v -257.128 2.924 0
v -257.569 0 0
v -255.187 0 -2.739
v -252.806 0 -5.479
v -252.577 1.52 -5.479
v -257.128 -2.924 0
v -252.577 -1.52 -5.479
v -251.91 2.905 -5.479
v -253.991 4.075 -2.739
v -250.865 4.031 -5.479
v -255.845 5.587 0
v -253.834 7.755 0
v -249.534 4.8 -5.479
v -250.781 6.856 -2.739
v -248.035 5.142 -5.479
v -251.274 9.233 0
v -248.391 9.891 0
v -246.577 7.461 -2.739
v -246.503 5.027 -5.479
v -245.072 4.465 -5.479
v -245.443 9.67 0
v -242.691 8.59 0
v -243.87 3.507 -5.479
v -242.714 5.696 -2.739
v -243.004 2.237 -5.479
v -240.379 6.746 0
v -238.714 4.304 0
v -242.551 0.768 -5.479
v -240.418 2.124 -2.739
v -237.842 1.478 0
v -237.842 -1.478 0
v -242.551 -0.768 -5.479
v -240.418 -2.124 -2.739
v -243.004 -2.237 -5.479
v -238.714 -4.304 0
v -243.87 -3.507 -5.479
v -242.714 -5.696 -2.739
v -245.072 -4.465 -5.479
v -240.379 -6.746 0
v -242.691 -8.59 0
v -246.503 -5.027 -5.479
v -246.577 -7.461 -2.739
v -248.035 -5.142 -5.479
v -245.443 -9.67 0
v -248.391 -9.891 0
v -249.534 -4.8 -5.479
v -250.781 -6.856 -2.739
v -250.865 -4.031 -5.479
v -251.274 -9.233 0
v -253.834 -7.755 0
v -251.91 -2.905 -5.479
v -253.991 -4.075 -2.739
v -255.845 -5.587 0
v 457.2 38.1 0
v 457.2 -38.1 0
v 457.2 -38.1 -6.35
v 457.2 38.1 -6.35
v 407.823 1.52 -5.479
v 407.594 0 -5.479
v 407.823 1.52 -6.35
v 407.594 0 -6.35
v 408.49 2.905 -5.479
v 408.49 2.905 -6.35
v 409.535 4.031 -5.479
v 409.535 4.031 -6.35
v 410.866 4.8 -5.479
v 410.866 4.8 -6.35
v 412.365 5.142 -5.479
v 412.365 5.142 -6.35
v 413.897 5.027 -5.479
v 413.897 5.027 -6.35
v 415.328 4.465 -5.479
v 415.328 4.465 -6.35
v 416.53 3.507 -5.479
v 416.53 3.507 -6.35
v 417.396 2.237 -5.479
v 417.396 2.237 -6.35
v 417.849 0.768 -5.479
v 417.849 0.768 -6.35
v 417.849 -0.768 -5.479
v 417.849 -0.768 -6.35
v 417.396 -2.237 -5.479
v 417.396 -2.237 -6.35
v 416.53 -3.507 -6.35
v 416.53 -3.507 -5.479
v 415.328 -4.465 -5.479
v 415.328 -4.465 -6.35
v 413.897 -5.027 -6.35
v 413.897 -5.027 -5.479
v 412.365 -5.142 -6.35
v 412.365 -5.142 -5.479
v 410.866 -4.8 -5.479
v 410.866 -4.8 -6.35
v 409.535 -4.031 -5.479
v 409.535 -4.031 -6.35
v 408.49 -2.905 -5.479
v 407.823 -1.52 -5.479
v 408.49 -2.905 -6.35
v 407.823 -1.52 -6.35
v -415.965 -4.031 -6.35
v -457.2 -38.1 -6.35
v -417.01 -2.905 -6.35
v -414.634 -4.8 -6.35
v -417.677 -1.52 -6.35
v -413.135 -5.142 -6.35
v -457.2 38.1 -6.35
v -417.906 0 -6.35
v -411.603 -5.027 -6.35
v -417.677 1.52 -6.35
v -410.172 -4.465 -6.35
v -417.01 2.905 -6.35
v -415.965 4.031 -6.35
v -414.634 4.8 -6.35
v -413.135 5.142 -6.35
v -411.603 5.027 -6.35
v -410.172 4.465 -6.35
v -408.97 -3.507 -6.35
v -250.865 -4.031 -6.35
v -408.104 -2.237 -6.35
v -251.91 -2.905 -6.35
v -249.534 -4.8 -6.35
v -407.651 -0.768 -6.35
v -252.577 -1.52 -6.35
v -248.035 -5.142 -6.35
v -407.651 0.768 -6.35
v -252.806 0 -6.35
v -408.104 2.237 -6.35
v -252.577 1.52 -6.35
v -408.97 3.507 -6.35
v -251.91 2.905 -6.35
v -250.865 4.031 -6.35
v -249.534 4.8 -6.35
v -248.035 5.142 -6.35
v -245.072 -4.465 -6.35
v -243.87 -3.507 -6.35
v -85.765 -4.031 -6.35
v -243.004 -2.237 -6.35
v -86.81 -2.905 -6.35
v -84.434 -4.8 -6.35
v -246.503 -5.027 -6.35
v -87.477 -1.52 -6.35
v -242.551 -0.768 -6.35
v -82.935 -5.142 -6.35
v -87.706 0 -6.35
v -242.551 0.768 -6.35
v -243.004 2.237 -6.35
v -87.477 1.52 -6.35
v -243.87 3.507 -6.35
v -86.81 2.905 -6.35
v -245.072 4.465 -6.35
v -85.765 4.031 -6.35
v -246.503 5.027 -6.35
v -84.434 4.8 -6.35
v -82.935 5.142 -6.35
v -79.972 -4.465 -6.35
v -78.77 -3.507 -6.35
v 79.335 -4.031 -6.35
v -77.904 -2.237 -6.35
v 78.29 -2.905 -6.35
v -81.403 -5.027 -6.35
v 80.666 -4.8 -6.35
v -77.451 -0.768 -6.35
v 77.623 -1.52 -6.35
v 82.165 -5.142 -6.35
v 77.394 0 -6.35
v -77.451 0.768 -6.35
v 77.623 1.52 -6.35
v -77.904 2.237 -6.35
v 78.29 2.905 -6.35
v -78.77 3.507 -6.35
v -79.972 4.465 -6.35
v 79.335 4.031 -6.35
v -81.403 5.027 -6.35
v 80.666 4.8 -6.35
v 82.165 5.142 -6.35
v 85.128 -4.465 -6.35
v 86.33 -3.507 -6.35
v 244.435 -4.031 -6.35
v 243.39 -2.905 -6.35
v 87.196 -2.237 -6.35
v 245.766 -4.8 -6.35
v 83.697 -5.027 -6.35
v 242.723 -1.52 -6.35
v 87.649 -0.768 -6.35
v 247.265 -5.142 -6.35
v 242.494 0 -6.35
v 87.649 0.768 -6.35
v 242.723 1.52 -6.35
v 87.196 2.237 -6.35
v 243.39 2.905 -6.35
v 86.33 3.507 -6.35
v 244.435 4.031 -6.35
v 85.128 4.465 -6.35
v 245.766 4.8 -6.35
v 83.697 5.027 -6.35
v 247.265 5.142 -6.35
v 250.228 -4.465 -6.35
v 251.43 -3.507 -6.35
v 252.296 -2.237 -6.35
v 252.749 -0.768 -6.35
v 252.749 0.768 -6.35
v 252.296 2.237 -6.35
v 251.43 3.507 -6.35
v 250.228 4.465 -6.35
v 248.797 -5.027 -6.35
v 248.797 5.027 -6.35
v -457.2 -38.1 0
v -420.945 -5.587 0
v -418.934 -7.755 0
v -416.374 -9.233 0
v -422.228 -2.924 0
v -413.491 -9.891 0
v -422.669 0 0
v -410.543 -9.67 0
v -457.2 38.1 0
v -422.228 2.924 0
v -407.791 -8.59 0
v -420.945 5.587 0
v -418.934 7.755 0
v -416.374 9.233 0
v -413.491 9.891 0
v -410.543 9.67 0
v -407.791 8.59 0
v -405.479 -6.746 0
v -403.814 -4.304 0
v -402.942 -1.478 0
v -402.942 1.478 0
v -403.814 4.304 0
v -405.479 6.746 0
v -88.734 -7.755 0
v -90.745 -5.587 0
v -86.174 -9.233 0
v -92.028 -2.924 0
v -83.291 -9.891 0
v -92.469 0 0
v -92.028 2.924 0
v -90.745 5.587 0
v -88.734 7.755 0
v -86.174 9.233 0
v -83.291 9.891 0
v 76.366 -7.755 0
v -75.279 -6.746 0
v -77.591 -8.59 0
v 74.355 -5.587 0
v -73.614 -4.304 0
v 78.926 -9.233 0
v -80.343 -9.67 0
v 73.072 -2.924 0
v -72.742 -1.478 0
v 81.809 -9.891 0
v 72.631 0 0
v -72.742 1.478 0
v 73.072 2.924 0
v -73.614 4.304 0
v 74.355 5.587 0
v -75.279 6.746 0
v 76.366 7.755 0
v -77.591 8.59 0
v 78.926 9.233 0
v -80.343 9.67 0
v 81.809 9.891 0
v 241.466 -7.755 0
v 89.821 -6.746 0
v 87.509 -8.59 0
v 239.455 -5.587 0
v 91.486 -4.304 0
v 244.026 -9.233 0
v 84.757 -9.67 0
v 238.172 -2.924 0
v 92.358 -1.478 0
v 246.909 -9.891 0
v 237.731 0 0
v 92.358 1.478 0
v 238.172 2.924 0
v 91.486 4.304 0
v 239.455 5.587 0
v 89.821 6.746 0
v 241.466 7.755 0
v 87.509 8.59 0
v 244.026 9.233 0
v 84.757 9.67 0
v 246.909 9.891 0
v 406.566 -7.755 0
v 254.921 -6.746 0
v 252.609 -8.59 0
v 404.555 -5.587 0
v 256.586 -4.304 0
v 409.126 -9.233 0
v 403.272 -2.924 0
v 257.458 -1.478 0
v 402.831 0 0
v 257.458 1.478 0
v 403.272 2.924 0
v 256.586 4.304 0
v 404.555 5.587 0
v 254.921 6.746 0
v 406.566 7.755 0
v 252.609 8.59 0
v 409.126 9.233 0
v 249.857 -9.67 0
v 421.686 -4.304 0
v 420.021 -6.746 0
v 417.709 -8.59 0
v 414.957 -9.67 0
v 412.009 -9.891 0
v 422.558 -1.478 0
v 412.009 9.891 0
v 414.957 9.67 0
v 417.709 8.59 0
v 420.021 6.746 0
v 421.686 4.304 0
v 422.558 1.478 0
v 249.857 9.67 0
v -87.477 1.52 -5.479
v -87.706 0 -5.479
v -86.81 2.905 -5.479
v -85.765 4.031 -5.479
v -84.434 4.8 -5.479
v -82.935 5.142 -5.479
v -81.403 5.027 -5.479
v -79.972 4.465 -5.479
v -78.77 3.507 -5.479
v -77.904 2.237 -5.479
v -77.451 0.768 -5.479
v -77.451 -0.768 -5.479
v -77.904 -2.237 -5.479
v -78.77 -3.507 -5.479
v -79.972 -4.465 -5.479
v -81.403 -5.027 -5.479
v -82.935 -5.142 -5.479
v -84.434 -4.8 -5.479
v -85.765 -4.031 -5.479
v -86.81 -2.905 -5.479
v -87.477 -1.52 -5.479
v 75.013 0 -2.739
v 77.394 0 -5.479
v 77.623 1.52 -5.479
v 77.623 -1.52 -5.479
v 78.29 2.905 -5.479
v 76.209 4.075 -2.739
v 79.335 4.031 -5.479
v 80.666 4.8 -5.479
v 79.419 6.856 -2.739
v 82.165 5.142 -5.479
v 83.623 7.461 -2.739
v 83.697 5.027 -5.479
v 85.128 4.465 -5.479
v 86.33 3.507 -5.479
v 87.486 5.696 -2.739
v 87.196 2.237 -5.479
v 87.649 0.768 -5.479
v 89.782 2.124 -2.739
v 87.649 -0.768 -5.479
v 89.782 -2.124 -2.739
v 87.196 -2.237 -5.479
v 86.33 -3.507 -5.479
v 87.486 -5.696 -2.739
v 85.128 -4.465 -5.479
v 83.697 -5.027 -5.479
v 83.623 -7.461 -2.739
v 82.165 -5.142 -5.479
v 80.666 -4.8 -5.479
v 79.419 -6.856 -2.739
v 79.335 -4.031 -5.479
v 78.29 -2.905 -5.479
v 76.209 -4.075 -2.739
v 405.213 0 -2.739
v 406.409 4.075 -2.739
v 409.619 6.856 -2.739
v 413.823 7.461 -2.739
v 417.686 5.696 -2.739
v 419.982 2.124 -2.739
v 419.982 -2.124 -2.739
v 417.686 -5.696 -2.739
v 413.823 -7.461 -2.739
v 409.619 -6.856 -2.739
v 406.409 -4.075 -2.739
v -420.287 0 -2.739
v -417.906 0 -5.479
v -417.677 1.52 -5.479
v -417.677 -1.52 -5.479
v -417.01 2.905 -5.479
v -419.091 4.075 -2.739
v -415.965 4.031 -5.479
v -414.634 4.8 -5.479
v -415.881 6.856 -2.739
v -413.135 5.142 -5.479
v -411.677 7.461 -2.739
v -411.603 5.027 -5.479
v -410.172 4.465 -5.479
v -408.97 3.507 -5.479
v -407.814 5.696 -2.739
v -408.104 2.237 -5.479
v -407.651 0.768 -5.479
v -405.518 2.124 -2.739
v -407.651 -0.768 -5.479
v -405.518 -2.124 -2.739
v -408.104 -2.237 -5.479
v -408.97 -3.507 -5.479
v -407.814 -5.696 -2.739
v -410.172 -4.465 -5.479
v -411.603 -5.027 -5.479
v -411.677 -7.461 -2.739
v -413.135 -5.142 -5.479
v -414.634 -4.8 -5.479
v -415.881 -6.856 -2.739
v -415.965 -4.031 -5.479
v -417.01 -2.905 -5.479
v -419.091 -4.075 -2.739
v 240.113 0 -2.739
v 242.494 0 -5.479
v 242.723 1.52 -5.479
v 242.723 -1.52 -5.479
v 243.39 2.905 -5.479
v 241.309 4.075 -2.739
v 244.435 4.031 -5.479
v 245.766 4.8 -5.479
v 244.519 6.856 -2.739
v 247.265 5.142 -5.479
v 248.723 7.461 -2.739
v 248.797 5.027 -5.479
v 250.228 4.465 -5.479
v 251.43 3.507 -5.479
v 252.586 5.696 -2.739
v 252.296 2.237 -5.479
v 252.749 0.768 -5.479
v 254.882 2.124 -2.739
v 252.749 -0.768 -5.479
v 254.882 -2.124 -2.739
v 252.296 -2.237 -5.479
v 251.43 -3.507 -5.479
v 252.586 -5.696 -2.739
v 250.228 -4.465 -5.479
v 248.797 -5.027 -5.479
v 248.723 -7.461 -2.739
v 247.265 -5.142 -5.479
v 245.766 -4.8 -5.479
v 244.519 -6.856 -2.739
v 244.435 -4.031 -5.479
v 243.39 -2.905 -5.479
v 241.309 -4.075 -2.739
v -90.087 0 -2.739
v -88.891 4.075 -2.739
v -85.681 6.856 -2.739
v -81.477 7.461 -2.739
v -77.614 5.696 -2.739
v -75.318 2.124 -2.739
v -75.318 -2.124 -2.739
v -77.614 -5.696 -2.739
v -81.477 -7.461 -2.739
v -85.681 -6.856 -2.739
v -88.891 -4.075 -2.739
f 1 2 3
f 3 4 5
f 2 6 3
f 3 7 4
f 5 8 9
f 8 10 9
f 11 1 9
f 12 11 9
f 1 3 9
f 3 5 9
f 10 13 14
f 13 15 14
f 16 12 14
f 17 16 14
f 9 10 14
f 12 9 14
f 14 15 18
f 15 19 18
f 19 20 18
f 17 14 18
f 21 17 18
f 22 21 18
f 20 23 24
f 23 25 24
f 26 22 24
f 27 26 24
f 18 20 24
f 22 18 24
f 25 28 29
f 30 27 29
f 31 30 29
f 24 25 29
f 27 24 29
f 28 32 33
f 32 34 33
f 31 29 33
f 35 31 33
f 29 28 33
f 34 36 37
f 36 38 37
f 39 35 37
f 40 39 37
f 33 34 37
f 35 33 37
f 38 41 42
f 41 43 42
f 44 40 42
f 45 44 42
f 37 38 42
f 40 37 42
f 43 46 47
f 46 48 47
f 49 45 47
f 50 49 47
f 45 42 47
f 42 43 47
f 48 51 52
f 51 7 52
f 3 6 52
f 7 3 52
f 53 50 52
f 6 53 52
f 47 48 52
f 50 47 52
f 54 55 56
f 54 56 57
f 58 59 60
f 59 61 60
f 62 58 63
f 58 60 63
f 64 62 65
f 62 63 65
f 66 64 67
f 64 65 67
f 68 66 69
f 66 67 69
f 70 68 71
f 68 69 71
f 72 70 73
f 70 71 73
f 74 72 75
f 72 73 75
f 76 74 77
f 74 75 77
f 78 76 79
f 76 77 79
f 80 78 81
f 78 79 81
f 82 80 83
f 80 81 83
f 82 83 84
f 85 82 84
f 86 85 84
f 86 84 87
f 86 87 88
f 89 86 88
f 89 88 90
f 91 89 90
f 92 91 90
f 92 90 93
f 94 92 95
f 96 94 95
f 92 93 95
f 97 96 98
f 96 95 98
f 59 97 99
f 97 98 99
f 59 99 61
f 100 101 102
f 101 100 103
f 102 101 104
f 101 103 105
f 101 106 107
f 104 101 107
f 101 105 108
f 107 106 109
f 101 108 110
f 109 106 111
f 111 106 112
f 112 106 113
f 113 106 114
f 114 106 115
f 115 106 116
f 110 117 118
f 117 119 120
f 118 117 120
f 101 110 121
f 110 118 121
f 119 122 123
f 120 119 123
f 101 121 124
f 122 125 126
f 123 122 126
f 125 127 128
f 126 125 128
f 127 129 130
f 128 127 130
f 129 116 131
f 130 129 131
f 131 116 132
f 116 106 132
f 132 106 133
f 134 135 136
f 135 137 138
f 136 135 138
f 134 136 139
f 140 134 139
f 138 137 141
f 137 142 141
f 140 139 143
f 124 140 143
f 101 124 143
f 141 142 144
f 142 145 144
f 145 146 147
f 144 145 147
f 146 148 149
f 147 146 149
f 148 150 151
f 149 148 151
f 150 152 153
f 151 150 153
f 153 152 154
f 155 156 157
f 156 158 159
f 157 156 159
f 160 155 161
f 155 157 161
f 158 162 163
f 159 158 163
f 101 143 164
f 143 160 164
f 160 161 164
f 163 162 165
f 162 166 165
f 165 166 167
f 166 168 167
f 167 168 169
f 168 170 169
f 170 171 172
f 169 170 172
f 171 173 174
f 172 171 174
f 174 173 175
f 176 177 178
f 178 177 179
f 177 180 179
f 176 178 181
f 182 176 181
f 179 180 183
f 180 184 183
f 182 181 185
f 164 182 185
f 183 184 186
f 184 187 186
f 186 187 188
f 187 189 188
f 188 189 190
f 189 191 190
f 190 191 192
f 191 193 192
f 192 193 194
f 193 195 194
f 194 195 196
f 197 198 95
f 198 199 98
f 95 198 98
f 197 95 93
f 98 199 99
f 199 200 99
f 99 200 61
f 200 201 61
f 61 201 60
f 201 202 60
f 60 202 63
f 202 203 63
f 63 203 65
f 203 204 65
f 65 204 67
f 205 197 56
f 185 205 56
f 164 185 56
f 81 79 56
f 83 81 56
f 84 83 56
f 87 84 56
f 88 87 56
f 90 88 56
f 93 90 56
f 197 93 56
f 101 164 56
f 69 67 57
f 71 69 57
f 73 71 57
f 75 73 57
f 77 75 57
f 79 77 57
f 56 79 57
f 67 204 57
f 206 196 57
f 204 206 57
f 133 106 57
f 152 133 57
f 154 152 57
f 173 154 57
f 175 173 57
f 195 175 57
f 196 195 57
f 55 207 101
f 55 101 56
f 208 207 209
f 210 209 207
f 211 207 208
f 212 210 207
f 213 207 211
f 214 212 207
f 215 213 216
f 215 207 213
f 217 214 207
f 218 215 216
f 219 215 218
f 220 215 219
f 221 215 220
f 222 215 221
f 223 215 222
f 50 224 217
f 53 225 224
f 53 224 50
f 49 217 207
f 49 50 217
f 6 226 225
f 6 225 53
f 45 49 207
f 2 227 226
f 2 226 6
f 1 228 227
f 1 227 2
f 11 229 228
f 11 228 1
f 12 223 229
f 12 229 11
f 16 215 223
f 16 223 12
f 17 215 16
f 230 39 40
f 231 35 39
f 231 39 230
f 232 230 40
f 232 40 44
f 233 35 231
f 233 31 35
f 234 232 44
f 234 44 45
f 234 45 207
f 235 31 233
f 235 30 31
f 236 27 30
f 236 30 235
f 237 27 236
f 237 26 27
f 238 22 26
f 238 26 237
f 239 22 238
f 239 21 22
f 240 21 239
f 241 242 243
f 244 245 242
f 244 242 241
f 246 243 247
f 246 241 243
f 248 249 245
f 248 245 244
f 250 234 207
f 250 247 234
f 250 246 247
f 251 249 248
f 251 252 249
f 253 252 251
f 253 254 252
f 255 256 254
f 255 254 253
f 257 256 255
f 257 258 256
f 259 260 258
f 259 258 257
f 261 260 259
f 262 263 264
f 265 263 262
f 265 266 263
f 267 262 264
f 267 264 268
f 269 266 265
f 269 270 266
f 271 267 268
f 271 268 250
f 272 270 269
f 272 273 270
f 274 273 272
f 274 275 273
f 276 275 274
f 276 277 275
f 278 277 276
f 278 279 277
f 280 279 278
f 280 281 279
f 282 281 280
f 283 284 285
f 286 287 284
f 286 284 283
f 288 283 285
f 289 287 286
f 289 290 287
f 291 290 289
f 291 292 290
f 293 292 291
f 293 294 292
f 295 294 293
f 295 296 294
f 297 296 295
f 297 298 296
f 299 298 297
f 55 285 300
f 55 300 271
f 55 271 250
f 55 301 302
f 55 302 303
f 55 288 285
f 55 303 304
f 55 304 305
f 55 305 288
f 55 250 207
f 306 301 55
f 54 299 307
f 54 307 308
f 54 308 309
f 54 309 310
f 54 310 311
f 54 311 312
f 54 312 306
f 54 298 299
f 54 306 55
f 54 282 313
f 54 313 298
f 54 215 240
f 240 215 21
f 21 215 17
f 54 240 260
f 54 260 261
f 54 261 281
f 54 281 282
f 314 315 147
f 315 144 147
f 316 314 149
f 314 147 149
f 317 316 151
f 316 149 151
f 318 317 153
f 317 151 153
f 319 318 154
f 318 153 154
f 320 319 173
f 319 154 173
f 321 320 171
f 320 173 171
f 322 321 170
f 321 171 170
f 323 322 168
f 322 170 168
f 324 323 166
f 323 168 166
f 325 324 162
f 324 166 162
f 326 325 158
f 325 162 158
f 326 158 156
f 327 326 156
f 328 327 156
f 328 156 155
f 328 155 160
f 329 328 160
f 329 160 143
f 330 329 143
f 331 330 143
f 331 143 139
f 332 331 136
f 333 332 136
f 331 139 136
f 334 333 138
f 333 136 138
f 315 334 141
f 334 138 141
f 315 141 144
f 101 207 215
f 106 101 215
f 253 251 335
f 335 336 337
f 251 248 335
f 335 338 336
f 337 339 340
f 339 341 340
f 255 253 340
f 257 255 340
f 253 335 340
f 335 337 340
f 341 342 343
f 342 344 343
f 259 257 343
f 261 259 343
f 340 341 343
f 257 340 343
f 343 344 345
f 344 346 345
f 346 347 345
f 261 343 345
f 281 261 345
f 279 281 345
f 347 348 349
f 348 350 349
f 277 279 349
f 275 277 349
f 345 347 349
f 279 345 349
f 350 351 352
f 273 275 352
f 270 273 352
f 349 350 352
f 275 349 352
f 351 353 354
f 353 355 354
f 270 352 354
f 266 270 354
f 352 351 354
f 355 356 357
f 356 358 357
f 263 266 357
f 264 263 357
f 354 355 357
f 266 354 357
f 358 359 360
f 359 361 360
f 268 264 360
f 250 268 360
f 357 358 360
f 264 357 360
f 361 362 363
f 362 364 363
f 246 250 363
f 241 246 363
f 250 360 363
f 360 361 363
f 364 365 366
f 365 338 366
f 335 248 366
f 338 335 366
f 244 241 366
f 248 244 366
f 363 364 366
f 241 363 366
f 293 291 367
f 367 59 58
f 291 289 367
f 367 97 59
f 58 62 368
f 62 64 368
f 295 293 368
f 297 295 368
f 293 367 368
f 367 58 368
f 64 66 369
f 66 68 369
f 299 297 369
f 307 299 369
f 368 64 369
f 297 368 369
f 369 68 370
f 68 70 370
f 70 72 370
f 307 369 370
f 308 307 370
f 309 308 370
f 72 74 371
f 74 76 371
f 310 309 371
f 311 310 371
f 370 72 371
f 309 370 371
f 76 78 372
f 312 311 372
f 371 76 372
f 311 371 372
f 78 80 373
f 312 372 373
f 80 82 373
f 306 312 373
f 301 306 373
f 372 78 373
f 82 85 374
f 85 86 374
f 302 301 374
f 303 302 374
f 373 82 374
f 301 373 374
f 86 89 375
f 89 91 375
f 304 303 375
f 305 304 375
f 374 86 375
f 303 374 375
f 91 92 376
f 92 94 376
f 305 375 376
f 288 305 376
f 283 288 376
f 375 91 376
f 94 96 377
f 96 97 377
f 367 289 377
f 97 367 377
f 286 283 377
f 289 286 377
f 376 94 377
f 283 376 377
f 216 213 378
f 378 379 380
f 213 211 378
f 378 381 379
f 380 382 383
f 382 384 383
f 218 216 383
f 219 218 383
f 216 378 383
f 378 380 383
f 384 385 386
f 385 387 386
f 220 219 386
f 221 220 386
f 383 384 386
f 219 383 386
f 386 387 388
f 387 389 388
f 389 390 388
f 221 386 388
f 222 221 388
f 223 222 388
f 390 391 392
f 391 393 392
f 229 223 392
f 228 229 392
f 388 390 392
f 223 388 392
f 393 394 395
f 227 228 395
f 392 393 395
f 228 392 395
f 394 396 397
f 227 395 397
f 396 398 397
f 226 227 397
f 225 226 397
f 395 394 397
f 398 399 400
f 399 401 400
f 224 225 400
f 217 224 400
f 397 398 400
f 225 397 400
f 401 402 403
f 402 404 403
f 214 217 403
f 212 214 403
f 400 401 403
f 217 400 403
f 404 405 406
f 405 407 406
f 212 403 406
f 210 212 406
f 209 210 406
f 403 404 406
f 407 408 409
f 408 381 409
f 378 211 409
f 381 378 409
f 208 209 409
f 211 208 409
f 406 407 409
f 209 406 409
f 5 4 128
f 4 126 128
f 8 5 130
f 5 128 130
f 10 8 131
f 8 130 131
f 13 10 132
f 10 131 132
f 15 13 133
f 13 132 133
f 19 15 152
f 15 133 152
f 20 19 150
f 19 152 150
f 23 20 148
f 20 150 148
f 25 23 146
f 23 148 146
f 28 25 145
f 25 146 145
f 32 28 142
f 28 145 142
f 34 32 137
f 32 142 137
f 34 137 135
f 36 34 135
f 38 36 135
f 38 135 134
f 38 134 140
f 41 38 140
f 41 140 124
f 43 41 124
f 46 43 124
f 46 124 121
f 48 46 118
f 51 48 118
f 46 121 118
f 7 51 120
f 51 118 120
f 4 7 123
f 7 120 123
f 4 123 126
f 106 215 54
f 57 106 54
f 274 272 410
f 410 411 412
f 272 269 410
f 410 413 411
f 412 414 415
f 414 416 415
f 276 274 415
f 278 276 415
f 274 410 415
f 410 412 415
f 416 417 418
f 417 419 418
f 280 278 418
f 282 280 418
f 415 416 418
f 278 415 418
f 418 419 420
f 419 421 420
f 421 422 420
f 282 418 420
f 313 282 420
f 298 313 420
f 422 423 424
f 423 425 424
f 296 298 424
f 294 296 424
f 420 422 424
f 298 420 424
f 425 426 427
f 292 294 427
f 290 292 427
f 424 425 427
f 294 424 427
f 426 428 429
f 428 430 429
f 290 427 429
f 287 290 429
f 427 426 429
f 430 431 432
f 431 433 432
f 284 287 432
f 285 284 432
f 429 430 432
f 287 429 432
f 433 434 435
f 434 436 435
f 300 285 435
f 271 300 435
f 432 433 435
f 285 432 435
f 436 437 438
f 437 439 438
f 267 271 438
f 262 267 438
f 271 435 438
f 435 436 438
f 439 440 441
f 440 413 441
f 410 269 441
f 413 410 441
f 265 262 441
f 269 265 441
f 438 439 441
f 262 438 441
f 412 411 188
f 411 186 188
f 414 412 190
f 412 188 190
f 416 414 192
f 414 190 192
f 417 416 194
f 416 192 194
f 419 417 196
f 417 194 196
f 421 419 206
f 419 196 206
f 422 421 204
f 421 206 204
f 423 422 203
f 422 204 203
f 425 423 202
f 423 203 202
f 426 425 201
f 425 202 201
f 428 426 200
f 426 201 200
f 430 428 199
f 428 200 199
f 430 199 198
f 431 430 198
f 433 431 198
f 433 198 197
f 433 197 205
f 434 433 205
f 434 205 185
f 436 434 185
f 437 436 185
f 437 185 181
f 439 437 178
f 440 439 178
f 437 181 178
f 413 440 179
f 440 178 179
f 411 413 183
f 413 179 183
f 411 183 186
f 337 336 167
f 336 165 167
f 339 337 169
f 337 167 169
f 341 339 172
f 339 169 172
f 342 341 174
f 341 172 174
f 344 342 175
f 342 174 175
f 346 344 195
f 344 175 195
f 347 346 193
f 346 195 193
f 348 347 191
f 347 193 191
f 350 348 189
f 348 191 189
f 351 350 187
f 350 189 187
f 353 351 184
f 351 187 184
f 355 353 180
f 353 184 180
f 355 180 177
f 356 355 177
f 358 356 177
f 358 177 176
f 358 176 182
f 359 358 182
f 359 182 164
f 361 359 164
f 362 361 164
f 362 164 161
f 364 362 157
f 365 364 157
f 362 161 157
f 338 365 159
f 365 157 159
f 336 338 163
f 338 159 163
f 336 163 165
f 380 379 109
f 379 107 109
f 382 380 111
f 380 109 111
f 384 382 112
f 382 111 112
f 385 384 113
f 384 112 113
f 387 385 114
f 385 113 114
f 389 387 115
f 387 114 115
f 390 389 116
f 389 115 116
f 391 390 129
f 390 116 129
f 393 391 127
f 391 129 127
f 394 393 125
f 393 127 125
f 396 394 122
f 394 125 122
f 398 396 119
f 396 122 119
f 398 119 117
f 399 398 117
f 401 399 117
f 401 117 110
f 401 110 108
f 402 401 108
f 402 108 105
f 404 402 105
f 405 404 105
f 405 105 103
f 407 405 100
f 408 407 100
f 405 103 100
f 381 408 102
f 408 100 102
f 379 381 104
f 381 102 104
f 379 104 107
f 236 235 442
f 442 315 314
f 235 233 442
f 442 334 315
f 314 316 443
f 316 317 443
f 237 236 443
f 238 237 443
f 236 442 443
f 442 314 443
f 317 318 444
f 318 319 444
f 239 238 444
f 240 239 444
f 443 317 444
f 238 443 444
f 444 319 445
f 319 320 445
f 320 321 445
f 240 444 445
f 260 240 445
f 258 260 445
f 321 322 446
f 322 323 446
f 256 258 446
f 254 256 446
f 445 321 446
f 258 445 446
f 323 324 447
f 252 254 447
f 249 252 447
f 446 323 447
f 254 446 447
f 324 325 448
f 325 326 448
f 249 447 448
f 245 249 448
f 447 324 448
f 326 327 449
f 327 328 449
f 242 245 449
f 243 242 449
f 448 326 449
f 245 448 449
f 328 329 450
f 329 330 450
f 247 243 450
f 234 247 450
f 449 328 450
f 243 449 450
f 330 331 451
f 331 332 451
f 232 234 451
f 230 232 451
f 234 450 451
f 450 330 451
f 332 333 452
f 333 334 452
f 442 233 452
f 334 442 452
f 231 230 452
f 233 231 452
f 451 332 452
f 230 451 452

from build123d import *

# Parameters (mm, degrees)
F0_W           = 914.4
F0_H           = 76.2
F0_R           = 4.7625
F1_DEPTH       = 6.35
F2_D           = 10.3124
F2_CSINK_D     = 19.8374
F2_CSINK_ANGLE = 82


with BuildPart() as f1:
    # F0 (on Top) → F1 (new body)
    with BuildSketch(Plane.XY):
        Rectangle(F0_W, F0_H)
        with Locations((-412.75, 0)):
            Circle(F0_R, mode=Mode.SUBTRACT)
        with Locations((-247.65, 0)):
            Circle(F0_R, mode=Mode.SUBTRACT)
        with Locations((-82.55, 0)):
            Circle(F0_R, mode=Mode.SUBTRACT)
        with Locations((82.55, 0)):
            Circle(F0_R, mode=Mode.SUBTRACT)
        with Locations((247.65, 0)):
            Circle(F0_R, mode=Mode.SUBTRACT)
        with Locations((412.75, 0)):
            Circle(F0_R, mode=Mode.SUBTRACT)
        with Locations((-82.55, 0)):
            Circle(F0_R)
        with Locations((82.55, 0)):
            Circle(F0_R)
        with Locations((247.65, 0)):
            Circle(F0_R)
        with Locations((412.75, 0)):
            Circle(F0_R)
        with Locations((-412.75, 0)):
            Circle(F0_R)
        with Locations((-247.65, 0)):
            Circle(F0_R)
    extrude(amount=-F1_DEPTH)

    # F2 (through all)
    with Locations(Plane.XY):
        with Locations((-412.75, 0), (-247.65, 0), (-82.55, 0), (82.55, 0), (247.65, 0), (412.75, 0)):
            CounterSinkHole(F2_D / 2, F2_CSINK_D / 2, counter_sink_angle=F2_CSINK_ANGLE)


solid = f1.part
